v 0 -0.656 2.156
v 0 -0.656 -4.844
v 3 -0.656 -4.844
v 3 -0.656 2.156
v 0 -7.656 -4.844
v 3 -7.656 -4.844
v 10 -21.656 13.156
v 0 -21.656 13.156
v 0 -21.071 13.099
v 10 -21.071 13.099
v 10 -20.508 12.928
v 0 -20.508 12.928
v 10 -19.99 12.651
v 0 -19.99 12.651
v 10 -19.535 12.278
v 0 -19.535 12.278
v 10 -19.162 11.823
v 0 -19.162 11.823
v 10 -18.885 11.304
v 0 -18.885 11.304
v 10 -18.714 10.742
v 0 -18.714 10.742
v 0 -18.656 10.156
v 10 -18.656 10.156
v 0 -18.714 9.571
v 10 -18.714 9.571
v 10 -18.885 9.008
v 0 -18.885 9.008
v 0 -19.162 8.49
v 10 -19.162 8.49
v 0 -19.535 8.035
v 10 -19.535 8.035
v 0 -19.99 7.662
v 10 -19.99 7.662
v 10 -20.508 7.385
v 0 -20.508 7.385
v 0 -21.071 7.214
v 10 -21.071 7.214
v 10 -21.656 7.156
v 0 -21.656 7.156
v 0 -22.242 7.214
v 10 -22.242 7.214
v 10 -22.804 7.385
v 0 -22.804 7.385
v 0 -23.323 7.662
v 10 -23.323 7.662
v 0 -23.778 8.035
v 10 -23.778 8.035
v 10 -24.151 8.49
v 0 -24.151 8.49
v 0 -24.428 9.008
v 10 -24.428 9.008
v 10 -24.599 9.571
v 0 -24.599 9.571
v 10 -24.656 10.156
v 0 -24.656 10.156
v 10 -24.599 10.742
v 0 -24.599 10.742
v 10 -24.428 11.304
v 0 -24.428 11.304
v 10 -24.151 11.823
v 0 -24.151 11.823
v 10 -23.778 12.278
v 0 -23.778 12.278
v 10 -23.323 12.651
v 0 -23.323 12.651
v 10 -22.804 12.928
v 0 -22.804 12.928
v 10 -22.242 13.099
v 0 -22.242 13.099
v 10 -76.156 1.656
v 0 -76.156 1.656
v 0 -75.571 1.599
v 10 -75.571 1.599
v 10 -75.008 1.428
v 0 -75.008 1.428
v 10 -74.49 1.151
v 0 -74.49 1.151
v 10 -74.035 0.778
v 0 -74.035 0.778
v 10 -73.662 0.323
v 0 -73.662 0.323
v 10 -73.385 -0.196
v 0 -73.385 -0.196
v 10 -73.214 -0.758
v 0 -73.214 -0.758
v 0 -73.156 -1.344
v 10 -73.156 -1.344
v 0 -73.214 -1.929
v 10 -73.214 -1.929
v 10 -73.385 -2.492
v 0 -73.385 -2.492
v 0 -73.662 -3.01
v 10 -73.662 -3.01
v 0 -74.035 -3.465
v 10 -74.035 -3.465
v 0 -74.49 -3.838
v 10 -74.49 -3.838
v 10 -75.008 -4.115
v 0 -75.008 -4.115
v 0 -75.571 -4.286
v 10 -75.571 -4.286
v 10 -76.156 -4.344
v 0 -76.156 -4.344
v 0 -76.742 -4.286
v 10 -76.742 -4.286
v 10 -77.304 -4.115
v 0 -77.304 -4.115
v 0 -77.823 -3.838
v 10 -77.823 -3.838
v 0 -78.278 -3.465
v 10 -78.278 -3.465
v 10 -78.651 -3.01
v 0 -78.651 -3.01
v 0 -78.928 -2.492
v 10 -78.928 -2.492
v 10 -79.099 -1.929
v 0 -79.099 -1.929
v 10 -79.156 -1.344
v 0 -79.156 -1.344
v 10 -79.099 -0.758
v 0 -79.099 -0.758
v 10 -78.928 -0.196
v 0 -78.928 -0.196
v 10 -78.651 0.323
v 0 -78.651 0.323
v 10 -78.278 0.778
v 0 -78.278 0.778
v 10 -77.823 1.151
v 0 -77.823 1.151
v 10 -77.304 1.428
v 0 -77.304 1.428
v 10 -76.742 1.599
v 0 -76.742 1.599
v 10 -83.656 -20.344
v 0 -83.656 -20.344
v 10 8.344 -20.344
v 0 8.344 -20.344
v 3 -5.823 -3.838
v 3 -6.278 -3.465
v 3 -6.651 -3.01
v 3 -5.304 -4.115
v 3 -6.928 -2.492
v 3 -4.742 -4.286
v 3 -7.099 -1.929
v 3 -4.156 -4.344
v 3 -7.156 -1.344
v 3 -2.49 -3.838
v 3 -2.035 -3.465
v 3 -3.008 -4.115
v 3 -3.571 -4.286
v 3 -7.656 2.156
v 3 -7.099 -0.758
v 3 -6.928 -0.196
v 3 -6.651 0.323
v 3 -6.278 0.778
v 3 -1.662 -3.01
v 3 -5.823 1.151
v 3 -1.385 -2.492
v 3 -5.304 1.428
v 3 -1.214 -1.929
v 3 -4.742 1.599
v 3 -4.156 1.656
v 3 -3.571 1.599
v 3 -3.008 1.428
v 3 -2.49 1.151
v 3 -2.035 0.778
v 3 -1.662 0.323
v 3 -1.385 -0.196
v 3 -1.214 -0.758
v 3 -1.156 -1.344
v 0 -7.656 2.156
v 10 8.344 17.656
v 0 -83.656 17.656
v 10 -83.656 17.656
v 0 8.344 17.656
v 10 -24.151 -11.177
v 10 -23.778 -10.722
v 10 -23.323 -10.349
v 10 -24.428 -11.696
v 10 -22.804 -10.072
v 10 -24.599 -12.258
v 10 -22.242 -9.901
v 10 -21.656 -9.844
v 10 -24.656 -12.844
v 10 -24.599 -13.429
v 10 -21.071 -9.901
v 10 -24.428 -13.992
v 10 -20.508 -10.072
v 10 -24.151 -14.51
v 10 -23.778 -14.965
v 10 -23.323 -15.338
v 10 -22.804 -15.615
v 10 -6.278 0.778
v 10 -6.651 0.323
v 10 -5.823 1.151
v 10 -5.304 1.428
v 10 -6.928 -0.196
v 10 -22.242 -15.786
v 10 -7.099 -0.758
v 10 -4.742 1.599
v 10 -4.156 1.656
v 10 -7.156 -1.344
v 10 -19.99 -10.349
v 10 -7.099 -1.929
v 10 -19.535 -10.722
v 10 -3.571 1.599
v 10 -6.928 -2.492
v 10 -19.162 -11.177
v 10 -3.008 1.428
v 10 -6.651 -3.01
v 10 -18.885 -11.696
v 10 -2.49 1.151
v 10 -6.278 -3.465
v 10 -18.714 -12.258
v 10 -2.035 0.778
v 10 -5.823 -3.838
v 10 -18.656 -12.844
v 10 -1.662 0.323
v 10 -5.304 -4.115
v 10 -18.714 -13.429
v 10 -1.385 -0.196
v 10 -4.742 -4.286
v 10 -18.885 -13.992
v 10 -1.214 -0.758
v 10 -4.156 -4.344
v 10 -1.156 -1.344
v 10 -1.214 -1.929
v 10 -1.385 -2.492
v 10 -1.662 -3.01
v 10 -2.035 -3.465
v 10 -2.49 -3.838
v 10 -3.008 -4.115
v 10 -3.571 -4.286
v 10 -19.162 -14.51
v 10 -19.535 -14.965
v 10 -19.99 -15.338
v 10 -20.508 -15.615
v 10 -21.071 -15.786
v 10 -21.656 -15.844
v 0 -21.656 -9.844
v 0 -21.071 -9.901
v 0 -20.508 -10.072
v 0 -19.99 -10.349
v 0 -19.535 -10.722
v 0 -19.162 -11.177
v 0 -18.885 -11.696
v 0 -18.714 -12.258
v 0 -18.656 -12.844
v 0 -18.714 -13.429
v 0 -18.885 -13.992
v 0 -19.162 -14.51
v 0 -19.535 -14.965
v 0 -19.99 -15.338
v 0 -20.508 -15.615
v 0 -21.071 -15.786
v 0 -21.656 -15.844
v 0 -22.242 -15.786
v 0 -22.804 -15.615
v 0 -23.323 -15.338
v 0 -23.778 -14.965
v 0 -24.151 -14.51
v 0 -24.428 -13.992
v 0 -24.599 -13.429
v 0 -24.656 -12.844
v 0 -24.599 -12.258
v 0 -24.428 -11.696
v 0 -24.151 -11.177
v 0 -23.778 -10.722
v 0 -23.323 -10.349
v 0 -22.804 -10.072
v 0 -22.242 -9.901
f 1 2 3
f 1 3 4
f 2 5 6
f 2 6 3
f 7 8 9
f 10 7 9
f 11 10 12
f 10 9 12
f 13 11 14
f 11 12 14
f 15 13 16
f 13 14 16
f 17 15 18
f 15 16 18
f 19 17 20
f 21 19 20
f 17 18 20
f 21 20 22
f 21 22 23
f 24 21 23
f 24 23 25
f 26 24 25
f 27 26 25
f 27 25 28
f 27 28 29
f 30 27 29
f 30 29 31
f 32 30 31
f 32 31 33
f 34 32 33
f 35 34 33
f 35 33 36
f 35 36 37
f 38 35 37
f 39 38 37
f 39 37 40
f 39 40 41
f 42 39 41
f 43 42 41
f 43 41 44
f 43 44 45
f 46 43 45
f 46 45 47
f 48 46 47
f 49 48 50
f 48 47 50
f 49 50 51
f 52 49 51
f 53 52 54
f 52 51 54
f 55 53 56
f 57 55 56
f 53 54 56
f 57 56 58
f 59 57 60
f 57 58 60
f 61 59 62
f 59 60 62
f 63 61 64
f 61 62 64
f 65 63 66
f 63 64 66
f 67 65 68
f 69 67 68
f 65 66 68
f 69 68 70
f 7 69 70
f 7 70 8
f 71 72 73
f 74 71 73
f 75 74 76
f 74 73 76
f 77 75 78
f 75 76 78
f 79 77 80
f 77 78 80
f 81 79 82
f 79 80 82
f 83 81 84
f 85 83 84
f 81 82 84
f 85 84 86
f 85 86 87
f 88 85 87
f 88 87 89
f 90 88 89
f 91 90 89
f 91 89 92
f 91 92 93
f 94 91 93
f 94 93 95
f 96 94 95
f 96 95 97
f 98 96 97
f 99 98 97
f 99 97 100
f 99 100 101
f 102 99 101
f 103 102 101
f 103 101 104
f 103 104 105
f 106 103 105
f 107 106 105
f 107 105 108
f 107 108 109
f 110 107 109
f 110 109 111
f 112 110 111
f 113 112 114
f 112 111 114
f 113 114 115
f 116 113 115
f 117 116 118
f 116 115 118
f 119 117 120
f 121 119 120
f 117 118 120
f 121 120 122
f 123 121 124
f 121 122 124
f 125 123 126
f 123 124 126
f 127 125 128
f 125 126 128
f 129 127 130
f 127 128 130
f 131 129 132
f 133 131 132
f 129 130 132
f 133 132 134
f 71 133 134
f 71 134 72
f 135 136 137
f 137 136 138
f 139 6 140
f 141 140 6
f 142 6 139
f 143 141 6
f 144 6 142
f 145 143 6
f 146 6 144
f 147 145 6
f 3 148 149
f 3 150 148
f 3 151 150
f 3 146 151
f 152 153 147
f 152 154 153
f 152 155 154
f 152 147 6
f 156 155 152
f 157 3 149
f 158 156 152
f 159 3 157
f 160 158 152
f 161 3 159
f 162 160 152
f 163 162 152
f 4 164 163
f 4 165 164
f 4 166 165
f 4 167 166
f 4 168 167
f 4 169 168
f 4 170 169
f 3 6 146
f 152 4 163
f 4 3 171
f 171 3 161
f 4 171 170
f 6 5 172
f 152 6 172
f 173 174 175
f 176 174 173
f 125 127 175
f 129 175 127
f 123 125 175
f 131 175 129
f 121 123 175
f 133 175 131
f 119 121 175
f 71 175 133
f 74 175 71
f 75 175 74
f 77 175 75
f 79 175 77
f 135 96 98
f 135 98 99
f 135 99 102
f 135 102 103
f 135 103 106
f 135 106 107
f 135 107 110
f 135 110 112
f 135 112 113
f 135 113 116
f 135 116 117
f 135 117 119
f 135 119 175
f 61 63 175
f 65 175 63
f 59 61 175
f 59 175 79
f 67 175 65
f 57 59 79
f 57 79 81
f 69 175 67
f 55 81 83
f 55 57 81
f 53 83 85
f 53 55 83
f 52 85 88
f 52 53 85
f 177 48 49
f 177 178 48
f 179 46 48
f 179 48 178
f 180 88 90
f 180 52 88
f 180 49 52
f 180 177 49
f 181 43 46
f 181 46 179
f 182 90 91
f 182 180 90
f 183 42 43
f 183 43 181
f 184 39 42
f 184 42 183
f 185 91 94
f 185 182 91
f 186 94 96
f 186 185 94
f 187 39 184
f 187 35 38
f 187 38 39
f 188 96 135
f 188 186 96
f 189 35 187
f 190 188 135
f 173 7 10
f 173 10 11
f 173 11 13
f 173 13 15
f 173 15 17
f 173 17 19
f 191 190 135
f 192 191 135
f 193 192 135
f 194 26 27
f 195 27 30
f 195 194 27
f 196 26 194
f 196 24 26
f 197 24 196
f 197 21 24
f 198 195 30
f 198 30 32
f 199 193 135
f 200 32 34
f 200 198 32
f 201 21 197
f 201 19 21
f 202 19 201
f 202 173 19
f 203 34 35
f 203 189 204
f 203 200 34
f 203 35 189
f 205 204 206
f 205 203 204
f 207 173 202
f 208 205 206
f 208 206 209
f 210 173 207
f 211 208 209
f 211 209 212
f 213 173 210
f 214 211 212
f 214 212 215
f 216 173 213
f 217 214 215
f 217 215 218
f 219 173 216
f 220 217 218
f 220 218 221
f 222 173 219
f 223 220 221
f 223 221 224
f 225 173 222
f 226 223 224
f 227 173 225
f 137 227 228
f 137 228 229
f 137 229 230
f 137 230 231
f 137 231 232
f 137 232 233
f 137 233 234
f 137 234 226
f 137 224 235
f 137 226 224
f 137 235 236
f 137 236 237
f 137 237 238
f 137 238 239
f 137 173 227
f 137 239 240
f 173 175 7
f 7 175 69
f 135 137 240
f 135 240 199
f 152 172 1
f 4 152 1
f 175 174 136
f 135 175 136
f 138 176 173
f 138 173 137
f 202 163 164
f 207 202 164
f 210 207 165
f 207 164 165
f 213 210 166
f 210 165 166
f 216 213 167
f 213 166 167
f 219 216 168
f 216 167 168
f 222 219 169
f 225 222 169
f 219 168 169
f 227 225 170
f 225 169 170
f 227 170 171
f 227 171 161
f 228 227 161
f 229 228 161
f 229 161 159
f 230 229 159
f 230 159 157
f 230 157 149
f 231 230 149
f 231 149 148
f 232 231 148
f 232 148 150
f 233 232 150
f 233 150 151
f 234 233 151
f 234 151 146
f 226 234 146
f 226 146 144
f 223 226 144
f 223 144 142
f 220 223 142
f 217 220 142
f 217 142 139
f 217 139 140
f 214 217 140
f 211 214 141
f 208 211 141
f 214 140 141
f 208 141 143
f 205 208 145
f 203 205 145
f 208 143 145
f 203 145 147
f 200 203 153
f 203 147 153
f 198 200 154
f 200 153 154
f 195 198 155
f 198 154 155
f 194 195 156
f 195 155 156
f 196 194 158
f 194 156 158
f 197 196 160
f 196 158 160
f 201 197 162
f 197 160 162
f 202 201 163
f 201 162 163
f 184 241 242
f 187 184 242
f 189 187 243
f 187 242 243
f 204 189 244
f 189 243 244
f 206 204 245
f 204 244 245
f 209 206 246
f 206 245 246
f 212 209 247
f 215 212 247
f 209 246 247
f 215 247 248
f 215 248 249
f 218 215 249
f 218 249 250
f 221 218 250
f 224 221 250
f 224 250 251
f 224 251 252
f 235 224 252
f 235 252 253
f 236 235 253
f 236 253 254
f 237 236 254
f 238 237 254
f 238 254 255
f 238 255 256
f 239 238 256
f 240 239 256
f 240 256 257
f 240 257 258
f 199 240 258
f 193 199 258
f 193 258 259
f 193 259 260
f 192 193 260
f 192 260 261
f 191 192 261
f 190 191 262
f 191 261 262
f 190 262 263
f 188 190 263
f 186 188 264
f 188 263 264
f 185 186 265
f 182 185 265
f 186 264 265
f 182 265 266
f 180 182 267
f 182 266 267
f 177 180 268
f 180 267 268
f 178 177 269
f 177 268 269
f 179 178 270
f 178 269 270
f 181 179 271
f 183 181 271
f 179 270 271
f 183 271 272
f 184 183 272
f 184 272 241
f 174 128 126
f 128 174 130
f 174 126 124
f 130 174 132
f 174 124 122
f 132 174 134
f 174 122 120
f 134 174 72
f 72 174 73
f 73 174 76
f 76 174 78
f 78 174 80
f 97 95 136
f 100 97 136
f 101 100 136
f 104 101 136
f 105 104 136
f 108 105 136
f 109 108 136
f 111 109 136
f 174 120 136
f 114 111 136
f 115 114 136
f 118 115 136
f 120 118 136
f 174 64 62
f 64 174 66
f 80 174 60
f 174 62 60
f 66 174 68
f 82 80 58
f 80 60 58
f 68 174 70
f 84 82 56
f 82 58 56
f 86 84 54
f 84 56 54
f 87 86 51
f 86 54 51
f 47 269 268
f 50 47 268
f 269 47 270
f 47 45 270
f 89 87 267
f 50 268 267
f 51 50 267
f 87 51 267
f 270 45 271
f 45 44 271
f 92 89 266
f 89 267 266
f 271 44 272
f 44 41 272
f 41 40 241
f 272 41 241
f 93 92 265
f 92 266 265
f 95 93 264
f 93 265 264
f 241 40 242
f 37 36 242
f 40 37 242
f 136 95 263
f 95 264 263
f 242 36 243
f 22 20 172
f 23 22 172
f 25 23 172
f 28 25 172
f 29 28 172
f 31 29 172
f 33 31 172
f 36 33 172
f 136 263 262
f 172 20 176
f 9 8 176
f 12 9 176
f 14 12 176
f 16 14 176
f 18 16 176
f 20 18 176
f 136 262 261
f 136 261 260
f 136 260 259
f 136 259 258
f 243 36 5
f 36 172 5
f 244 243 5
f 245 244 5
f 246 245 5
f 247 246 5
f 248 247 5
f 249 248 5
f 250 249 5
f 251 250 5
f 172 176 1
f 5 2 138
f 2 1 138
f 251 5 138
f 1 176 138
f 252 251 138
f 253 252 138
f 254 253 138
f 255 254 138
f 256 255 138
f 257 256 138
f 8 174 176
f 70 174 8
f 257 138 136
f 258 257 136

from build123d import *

# Parameters (mm, degrees)
SKETCH1_W           = 38
SKETCH1_H           = 92
BOSS_EXTRUDE1_DEPTH = 10
SKETCH4_W           = 7
SKETCH4_H           = 7
CUT_EXTRUDE3_DEPTH  = 3
SKETCH7_R           = 3
CUT_EXTRUDE4_DEPTH  = 8
SKETCH8_R           = 3
CUT_EXTRUDE5_DEPTH  = 11
SKETCH9_R           = 3
CUT_EXTRUDE6_DEPTH  = 11


with BuildPart() as part:
    # Sketch1 → Boss-Extrude1 (new body)
    with BuildSketch(Plane(origin=(0, 0, 0), x_dir=(0, 0, -1), z_dir=(1, 0, 0))):
        with Locations((1.34375, -37.65625)):
            Rectangle(SKETCH1_W, SKETCH1_H)
    extrude(amount=BOSS_EXTRUDE1_DEPTH)

    # Sketch4 → Cut-Extrude3 (cut)
    with BuildSketch(Plane.ZY):
        with Locations((-1.34375, -4.15625)):
            Rectangle(SKETCH4_W, SKETCH4_H)
    extrude(amount=-CUT_EXTRUDE3_DEPTH, mode=Mode.SUBTRACT)

    # Sketch7 → Cut-Extrude4 (cut, through all)
    with BuildSketch(Plane.ZY.offset(-3)):
        with Locations((-1.34375, -4.15625)):
            Circle(SKETCH7_R)
    extrude(amount=-CUT_EXTRUDE4_DEPTH, mode=Mode.SUBTRACT)

    # Sketch8 → Cut-Extrude5 (cut, through all)
    with BuildSketch(Plane.ZY):
        with Locations((-1.34375, -76.15625)):
            Circle(SKETCH8_R)
    extrude(amount=-CUT_EXTRUDE5_DEPTH, mode=Mode.SUBTRACT)

    # Sketch9 → Cut-Extrude6 (cut, through all)
    with BuildSketch(Plane.ZY):
        with Locations((10.15625, -21.65625)):
            Circle(SKETCH9_R)
        with Locations((-12.84375, -21.65625)):
            Circle(SKETCH9_R)
    extrude(amount=-CUT_EXTRUDE6_DEPTH, mode=Mode.SUBTRACT)


solid = part.part
